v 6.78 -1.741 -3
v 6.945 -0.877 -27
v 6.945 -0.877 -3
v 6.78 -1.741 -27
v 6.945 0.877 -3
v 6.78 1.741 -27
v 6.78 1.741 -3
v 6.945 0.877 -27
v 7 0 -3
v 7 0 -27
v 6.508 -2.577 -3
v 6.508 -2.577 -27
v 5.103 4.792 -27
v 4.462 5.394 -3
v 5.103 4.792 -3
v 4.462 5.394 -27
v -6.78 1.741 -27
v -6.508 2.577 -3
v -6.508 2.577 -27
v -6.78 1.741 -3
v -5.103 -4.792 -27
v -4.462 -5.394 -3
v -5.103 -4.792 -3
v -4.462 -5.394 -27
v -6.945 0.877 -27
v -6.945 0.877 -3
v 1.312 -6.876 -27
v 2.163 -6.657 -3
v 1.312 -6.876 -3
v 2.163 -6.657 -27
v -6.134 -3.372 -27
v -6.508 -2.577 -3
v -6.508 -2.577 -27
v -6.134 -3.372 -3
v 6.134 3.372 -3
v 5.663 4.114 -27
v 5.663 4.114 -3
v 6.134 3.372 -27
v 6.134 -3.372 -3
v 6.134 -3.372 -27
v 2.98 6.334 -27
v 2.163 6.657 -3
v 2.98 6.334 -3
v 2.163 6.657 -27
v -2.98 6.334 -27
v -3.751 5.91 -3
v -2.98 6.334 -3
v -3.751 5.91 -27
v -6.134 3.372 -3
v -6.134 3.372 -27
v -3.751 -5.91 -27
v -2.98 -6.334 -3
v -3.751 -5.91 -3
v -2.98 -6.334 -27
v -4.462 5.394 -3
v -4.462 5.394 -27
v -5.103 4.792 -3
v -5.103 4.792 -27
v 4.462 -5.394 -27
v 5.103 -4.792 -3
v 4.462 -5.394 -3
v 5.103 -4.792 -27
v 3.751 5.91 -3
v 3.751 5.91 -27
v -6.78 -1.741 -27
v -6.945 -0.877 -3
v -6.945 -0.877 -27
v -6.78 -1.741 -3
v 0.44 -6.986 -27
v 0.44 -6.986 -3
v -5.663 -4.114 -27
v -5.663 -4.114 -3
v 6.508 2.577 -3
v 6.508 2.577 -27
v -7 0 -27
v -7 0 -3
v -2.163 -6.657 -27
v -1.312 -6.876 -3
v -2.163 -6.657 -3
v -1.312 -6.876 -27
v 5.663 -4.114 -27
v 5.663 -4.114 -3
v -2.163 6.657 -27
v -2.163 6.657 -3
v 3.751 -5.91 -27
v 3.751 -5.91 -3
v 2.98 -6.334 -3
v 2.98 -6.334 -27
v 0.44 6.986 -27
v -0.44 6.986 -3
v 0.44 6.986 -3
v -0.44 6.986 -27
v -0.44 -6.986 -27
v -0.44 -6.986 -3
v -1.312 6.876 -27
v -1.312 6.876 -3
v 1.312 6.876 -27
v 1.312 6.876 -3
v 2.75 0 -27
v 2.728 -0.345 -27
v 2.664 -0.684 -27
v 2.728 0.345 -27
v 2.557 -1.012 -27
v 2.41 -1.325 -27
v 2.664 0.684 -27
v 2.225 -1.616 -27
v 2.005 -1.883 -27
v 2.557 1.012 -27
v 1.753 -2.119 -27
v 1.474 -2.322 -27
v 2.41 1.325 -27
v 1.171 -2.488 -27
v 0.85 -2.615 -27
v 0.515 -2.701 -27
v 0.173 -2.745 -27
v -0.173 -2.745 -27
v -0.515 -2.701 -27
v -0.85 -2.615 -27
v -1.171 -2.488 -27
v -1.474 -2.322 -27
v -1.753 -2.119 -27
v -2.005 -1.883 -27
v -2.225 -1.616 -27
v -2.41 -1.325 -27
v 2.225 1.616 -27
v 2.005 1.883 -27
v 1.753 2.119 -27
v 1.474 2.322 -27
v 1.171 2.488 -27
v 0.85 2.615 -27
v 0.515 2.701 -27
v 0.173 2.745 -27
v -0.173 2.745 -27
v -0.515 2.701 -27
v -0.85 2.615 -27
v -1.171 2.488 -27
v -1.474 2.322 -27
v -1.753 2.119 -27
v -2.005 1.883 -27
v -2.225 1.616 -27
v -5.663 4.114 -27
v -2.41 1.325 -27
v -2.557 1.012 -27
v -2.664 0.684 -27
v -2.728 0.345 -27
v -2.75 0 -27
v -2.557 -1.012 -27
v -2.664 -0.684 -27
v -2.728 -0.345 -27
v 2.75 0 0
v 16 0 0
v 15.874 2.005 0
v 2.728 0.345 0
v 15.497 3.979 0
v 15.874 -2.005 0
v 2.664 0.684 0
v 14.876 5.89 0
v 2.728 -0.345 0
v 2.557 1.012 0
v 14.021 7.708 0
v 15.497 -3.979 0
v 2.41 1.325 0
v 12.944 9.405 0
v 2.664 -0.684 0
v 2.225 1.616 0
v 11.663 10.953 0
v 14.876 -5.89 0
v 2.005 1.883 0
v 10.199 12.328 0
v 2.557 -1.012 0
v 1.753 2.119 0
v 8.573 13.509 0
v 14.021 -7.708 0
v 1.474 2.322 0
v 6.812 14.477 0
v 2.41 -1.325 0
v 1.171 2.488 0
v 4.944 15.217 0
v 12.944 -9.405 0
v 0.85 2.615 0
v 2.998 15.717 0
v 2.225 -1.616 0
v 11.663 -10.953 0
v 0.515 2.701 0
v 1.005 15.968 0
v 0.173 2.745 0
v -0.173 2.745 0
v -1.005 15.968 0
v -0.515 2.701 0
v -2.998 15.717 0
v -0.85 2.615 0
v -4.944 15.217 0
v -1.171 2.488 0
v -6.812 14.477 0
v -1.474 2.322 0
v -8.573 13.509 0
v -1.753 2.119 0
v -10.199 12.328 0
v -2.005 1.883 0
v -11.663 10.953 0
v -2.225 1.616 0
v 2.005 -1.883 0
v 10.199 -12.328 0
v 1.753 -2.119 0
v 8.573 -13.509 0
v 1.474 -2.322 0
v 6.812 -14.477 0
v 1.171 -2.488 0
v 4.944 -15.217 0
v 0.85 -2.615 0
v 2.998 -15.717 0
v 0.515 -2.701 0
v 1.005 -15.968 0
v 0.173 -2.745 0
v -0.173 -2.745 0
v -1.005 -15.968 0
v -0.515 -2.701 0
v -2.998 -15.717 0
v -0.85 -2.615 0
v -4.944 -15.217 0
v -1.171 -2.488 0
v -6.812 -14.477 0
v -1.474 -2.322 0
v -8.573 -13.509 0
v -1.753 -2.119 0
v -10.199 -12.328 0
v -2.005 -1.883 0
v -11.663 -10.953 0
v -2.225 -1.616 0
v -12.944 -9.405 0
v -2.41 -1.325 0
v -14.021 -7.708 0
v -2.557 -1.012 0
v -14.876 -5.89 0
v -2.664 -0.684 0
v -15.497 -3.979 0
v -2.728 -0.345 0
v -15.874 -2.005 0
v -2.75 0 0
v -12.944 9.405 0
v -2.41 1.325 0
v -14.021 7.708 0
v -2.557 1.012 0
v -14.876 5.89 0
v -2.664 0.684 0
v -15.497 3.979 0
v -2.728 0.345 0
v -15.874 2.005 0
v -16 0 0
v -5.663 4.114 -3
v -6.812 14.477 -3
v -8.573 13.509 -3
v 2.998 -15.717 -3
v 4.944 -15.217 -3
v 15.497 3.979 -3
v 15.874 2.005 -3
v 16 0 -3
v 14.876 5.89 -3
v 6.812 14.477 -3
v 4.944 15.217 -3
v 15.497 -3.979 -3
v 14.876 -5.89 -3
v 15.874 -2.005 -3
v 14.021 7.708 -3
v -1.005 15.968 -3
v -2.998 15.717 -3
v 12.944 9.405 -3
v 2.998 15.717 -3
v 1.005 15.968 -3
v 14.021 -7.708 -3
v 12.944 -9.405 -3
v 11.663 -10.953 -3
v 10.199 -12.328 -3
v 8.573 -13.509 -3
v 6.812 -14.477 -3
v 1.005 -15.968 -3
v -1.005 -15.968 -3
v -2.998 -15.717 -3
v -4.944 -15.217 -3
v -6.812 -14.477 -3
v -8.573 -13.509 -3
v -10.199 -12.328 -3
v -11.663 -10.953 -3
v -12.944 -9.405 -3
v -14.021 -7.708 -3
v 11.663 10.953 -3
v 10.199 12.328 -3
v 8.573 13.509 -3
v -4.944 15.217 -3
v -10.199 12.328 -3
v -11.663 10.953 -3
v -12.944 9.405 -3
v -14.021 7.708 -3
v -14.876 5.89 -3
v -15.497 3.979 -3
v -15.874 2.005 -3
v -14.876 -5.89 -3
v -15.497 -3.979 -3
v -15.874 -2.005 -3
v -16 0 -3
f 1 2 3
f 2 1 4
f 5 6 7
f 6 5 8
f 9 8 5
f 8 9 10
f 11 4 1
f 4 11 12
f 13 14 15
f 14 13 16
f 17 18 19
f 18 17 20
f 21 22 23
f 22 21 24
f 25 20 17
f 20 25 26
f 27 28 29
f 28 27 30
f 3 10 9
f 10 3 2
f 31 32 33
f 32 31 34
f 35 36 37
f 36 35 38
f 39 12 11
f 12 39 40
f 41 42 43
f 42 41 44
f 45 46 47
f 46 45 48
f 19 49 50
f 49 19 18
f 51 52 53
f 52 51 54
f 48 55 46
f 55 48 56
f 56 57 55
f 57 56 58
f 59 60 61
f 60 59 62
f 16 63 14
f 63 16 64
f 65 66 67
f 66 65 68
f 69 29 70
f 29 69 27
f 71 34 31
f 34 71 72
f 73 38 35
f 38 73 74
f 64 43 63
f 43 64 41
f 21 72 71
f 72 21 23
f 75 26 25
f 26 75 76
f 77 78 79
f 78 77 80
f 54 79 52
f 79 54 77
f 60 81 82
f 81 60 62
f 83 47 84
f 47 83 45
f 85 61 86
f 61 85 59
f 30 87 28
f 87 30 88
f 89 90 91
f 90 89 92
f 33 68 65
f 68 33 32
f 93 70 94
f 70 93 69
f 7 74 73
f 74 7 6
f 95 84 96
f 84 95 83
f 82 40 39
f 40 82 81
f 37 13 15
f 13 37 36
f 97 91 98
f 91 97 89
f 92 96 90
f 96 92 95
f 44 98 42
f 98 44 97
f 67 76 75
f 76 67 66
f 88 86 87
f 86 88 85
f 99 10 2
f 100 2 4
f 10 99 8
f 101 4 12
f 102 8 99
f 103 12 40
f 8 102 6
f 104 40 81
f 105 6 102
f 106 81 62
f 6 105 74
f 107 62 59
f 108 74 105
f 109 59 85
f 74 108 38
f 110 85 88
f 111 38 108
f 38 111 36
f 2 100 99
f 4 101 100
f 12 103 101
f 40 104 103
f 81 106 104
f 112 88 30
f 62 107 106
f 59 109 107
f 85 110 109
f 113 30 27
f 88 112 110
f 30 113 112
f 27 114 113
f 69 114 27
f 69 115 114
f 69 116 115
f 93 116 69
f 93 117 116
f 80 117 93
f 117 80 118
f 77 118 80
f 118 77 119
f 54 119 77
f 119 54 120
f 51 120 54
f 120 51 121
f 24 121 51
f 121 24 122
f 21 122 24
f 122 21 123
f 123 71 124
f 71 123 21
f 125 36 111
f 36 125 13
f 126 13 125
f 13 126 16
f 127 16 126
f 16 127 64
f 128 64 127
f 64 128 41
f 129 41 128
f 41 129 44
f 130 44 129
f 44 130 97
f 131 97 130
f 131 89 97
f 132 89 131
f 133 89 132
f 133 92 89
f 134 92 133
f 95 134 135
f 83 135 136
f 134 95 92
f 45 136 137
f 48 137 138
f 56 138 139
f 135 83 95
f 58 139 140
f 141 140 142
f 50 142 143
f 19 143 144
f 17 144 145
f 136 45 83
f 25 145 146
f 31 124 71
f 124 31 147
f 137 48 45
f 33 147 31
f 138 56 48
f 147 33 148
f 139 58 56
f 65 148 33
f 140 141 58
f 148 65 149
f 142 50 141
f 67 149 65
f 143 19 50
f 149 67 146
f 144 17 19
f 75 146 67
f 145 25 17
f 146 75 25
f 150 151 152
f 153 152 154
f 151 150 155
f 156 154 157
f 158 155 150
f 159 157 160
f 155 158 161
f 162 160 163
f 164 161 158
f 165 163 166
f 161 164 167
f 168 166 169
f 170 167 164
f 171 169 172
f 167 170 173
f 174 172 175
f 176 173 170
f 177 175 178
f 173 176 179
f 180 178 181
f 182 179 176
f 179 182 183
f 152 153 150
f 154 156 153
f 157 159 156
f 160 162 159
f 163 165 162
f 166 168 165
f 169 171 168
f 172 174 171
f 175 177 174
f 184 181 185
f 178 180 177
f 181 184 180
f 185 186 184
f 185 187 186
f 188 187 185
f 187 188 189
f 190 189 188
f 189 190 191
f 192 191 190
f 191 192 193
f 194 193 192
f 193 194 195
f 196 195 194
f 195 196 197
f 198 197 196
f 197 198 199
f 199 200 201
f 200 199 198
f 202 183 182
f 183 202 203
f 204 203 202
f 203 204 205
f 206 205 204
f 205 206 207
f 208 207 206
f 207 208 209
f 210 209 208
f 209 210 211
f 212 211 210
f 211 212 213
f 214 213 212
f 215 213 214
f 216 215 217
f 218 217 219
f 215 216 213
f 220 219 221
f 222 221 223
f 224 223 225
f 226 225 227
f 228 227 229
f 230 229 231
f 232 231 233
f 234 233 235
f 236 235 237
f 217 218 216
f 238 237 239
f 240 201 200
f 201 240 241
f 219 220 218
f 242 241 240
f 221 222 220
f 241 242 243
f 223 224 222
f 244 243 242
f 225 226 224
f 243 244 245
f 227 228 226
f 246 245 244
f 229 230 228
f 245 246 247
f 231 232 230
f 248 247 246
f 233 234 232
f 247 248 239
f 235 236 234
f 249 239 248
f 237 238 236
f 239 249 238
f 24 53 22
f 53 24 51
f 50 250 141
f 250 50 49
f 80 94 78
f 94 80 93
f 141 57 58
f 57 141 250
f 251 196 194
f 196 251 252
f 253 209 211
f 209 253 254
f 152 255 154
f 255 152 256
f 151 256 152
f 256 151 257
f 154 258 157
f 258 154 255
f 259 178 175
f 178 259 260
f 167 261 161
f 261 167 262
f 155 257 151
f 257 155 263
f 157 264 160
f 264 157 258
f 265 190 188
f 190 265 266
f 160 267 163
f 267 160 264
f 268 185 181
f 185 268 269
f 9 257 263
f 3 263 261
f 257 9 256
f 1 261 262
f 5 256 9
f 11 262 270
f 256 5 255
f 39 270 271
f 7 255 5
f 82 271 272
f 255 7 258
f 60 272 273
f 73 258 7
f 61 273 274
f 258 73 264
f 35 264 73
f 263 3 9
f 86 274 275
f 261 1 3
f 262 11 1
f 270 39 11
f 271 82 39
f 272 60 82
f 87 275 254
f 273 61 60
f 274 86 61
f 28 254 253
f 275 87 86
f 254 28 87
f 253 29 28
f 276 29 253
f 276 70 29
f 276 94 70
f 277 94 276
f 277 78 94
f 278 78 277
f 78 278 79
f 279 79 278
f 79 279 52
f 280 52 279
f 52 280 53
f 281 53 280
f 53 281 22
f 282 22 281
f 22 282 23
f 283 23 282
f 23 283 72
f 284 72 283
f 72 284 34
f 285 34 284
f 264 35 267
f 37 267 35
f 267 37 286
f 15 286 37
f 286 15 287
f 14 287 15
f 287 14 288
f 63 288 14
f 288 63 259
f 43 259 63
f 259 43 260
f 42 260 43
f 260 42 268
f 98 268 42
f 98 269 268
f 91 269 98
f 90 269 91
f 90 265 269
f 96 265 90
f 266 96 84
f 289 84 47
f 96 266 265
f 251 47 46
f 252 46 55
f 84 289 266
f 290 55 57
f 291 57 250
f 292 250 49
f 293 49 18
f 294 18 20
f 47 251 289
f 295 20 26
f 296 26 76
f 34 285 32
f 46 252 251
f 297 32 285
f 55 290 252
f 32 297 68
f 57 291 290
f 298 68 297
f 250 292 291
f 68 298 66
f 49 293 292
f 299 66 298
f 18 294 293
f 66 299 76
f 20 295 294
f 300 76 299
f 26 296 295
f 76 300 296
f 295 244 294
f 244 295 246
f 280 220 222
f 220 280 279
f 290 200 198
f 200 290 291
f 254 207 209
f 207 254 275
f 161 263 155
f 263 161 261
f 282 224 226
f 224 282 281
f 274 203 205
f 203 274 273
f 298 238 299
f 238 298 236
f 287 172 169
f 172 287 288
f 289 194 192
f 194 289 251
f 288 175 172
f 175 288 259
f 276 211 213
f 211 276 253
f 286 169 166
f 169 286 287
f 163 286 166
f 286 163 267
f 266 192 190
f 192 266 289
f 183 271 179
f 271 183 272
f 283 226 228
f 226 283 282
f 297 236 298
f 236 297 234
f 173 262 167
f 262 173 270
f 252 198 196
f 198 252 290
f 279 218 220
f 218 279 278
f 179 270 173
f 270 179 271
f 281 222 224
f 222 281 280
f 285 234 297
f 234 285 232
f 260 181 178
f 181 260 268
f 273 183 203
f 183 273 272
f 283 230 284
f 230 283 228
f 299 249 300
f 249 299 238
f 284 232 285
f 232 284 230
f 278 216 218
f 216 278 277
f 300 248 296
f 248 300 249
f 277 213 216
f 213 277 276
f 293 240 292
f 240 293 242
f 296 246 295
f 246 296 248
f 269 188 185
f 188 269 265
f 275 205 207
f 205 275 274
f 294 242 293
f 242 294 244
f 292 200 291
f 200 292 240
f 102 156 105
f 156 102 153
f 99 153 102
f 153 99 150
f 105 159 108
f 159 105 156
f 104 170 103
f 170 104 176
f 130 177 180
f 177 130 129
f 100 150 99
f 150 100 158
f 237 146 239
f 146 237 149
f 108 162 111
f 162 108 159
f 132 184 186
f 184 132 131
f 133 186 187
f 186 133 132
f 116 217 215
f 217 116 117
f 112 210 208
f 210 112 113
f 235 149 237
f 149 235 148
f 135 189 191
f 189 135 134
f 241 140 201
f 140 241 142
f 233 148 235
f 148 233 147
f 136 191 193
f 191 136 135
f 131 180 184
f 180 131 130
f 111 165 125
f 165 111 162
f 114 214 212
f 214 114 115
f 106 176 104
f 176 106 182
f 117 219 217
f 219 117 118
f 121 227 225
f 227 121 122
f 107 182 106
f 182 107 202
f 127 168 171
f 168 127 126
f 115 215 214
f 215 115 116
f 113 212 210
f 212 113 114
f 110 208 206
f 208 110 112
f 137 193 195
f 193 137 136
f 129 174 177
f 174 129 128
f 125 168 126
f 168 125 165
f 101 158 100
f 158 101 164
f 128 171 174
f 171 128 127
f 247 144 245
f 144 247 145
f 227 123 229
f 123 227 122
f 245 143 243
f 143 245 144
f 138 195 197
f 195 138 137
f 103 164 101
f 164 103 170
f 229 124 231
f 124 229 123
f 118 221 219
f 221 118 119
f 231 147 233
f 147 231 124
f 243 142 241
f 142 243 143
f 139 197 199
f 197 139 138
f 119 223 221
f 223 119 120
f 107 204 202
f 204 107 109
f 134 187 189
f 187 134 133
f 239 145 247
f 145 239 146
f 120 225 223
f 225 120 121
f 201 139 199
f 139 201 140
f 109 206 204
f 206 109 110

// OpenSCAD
$fn = 50;


difference() {
	union() {
		translate(v = [0, 0, -27.0000000000]) {
			cylinder(h = 27, r = 7.0000000000);
		}
		translate(v = [0, 0, -3.0000000000]) {
			cylinder(h = 3, r = 16.0000000000);
		}
	}
	union() {
		#translate(v = [0, 0, -27]) {
			cylinder(h = 27, r = 2.7500000000);
		}
	}
}
